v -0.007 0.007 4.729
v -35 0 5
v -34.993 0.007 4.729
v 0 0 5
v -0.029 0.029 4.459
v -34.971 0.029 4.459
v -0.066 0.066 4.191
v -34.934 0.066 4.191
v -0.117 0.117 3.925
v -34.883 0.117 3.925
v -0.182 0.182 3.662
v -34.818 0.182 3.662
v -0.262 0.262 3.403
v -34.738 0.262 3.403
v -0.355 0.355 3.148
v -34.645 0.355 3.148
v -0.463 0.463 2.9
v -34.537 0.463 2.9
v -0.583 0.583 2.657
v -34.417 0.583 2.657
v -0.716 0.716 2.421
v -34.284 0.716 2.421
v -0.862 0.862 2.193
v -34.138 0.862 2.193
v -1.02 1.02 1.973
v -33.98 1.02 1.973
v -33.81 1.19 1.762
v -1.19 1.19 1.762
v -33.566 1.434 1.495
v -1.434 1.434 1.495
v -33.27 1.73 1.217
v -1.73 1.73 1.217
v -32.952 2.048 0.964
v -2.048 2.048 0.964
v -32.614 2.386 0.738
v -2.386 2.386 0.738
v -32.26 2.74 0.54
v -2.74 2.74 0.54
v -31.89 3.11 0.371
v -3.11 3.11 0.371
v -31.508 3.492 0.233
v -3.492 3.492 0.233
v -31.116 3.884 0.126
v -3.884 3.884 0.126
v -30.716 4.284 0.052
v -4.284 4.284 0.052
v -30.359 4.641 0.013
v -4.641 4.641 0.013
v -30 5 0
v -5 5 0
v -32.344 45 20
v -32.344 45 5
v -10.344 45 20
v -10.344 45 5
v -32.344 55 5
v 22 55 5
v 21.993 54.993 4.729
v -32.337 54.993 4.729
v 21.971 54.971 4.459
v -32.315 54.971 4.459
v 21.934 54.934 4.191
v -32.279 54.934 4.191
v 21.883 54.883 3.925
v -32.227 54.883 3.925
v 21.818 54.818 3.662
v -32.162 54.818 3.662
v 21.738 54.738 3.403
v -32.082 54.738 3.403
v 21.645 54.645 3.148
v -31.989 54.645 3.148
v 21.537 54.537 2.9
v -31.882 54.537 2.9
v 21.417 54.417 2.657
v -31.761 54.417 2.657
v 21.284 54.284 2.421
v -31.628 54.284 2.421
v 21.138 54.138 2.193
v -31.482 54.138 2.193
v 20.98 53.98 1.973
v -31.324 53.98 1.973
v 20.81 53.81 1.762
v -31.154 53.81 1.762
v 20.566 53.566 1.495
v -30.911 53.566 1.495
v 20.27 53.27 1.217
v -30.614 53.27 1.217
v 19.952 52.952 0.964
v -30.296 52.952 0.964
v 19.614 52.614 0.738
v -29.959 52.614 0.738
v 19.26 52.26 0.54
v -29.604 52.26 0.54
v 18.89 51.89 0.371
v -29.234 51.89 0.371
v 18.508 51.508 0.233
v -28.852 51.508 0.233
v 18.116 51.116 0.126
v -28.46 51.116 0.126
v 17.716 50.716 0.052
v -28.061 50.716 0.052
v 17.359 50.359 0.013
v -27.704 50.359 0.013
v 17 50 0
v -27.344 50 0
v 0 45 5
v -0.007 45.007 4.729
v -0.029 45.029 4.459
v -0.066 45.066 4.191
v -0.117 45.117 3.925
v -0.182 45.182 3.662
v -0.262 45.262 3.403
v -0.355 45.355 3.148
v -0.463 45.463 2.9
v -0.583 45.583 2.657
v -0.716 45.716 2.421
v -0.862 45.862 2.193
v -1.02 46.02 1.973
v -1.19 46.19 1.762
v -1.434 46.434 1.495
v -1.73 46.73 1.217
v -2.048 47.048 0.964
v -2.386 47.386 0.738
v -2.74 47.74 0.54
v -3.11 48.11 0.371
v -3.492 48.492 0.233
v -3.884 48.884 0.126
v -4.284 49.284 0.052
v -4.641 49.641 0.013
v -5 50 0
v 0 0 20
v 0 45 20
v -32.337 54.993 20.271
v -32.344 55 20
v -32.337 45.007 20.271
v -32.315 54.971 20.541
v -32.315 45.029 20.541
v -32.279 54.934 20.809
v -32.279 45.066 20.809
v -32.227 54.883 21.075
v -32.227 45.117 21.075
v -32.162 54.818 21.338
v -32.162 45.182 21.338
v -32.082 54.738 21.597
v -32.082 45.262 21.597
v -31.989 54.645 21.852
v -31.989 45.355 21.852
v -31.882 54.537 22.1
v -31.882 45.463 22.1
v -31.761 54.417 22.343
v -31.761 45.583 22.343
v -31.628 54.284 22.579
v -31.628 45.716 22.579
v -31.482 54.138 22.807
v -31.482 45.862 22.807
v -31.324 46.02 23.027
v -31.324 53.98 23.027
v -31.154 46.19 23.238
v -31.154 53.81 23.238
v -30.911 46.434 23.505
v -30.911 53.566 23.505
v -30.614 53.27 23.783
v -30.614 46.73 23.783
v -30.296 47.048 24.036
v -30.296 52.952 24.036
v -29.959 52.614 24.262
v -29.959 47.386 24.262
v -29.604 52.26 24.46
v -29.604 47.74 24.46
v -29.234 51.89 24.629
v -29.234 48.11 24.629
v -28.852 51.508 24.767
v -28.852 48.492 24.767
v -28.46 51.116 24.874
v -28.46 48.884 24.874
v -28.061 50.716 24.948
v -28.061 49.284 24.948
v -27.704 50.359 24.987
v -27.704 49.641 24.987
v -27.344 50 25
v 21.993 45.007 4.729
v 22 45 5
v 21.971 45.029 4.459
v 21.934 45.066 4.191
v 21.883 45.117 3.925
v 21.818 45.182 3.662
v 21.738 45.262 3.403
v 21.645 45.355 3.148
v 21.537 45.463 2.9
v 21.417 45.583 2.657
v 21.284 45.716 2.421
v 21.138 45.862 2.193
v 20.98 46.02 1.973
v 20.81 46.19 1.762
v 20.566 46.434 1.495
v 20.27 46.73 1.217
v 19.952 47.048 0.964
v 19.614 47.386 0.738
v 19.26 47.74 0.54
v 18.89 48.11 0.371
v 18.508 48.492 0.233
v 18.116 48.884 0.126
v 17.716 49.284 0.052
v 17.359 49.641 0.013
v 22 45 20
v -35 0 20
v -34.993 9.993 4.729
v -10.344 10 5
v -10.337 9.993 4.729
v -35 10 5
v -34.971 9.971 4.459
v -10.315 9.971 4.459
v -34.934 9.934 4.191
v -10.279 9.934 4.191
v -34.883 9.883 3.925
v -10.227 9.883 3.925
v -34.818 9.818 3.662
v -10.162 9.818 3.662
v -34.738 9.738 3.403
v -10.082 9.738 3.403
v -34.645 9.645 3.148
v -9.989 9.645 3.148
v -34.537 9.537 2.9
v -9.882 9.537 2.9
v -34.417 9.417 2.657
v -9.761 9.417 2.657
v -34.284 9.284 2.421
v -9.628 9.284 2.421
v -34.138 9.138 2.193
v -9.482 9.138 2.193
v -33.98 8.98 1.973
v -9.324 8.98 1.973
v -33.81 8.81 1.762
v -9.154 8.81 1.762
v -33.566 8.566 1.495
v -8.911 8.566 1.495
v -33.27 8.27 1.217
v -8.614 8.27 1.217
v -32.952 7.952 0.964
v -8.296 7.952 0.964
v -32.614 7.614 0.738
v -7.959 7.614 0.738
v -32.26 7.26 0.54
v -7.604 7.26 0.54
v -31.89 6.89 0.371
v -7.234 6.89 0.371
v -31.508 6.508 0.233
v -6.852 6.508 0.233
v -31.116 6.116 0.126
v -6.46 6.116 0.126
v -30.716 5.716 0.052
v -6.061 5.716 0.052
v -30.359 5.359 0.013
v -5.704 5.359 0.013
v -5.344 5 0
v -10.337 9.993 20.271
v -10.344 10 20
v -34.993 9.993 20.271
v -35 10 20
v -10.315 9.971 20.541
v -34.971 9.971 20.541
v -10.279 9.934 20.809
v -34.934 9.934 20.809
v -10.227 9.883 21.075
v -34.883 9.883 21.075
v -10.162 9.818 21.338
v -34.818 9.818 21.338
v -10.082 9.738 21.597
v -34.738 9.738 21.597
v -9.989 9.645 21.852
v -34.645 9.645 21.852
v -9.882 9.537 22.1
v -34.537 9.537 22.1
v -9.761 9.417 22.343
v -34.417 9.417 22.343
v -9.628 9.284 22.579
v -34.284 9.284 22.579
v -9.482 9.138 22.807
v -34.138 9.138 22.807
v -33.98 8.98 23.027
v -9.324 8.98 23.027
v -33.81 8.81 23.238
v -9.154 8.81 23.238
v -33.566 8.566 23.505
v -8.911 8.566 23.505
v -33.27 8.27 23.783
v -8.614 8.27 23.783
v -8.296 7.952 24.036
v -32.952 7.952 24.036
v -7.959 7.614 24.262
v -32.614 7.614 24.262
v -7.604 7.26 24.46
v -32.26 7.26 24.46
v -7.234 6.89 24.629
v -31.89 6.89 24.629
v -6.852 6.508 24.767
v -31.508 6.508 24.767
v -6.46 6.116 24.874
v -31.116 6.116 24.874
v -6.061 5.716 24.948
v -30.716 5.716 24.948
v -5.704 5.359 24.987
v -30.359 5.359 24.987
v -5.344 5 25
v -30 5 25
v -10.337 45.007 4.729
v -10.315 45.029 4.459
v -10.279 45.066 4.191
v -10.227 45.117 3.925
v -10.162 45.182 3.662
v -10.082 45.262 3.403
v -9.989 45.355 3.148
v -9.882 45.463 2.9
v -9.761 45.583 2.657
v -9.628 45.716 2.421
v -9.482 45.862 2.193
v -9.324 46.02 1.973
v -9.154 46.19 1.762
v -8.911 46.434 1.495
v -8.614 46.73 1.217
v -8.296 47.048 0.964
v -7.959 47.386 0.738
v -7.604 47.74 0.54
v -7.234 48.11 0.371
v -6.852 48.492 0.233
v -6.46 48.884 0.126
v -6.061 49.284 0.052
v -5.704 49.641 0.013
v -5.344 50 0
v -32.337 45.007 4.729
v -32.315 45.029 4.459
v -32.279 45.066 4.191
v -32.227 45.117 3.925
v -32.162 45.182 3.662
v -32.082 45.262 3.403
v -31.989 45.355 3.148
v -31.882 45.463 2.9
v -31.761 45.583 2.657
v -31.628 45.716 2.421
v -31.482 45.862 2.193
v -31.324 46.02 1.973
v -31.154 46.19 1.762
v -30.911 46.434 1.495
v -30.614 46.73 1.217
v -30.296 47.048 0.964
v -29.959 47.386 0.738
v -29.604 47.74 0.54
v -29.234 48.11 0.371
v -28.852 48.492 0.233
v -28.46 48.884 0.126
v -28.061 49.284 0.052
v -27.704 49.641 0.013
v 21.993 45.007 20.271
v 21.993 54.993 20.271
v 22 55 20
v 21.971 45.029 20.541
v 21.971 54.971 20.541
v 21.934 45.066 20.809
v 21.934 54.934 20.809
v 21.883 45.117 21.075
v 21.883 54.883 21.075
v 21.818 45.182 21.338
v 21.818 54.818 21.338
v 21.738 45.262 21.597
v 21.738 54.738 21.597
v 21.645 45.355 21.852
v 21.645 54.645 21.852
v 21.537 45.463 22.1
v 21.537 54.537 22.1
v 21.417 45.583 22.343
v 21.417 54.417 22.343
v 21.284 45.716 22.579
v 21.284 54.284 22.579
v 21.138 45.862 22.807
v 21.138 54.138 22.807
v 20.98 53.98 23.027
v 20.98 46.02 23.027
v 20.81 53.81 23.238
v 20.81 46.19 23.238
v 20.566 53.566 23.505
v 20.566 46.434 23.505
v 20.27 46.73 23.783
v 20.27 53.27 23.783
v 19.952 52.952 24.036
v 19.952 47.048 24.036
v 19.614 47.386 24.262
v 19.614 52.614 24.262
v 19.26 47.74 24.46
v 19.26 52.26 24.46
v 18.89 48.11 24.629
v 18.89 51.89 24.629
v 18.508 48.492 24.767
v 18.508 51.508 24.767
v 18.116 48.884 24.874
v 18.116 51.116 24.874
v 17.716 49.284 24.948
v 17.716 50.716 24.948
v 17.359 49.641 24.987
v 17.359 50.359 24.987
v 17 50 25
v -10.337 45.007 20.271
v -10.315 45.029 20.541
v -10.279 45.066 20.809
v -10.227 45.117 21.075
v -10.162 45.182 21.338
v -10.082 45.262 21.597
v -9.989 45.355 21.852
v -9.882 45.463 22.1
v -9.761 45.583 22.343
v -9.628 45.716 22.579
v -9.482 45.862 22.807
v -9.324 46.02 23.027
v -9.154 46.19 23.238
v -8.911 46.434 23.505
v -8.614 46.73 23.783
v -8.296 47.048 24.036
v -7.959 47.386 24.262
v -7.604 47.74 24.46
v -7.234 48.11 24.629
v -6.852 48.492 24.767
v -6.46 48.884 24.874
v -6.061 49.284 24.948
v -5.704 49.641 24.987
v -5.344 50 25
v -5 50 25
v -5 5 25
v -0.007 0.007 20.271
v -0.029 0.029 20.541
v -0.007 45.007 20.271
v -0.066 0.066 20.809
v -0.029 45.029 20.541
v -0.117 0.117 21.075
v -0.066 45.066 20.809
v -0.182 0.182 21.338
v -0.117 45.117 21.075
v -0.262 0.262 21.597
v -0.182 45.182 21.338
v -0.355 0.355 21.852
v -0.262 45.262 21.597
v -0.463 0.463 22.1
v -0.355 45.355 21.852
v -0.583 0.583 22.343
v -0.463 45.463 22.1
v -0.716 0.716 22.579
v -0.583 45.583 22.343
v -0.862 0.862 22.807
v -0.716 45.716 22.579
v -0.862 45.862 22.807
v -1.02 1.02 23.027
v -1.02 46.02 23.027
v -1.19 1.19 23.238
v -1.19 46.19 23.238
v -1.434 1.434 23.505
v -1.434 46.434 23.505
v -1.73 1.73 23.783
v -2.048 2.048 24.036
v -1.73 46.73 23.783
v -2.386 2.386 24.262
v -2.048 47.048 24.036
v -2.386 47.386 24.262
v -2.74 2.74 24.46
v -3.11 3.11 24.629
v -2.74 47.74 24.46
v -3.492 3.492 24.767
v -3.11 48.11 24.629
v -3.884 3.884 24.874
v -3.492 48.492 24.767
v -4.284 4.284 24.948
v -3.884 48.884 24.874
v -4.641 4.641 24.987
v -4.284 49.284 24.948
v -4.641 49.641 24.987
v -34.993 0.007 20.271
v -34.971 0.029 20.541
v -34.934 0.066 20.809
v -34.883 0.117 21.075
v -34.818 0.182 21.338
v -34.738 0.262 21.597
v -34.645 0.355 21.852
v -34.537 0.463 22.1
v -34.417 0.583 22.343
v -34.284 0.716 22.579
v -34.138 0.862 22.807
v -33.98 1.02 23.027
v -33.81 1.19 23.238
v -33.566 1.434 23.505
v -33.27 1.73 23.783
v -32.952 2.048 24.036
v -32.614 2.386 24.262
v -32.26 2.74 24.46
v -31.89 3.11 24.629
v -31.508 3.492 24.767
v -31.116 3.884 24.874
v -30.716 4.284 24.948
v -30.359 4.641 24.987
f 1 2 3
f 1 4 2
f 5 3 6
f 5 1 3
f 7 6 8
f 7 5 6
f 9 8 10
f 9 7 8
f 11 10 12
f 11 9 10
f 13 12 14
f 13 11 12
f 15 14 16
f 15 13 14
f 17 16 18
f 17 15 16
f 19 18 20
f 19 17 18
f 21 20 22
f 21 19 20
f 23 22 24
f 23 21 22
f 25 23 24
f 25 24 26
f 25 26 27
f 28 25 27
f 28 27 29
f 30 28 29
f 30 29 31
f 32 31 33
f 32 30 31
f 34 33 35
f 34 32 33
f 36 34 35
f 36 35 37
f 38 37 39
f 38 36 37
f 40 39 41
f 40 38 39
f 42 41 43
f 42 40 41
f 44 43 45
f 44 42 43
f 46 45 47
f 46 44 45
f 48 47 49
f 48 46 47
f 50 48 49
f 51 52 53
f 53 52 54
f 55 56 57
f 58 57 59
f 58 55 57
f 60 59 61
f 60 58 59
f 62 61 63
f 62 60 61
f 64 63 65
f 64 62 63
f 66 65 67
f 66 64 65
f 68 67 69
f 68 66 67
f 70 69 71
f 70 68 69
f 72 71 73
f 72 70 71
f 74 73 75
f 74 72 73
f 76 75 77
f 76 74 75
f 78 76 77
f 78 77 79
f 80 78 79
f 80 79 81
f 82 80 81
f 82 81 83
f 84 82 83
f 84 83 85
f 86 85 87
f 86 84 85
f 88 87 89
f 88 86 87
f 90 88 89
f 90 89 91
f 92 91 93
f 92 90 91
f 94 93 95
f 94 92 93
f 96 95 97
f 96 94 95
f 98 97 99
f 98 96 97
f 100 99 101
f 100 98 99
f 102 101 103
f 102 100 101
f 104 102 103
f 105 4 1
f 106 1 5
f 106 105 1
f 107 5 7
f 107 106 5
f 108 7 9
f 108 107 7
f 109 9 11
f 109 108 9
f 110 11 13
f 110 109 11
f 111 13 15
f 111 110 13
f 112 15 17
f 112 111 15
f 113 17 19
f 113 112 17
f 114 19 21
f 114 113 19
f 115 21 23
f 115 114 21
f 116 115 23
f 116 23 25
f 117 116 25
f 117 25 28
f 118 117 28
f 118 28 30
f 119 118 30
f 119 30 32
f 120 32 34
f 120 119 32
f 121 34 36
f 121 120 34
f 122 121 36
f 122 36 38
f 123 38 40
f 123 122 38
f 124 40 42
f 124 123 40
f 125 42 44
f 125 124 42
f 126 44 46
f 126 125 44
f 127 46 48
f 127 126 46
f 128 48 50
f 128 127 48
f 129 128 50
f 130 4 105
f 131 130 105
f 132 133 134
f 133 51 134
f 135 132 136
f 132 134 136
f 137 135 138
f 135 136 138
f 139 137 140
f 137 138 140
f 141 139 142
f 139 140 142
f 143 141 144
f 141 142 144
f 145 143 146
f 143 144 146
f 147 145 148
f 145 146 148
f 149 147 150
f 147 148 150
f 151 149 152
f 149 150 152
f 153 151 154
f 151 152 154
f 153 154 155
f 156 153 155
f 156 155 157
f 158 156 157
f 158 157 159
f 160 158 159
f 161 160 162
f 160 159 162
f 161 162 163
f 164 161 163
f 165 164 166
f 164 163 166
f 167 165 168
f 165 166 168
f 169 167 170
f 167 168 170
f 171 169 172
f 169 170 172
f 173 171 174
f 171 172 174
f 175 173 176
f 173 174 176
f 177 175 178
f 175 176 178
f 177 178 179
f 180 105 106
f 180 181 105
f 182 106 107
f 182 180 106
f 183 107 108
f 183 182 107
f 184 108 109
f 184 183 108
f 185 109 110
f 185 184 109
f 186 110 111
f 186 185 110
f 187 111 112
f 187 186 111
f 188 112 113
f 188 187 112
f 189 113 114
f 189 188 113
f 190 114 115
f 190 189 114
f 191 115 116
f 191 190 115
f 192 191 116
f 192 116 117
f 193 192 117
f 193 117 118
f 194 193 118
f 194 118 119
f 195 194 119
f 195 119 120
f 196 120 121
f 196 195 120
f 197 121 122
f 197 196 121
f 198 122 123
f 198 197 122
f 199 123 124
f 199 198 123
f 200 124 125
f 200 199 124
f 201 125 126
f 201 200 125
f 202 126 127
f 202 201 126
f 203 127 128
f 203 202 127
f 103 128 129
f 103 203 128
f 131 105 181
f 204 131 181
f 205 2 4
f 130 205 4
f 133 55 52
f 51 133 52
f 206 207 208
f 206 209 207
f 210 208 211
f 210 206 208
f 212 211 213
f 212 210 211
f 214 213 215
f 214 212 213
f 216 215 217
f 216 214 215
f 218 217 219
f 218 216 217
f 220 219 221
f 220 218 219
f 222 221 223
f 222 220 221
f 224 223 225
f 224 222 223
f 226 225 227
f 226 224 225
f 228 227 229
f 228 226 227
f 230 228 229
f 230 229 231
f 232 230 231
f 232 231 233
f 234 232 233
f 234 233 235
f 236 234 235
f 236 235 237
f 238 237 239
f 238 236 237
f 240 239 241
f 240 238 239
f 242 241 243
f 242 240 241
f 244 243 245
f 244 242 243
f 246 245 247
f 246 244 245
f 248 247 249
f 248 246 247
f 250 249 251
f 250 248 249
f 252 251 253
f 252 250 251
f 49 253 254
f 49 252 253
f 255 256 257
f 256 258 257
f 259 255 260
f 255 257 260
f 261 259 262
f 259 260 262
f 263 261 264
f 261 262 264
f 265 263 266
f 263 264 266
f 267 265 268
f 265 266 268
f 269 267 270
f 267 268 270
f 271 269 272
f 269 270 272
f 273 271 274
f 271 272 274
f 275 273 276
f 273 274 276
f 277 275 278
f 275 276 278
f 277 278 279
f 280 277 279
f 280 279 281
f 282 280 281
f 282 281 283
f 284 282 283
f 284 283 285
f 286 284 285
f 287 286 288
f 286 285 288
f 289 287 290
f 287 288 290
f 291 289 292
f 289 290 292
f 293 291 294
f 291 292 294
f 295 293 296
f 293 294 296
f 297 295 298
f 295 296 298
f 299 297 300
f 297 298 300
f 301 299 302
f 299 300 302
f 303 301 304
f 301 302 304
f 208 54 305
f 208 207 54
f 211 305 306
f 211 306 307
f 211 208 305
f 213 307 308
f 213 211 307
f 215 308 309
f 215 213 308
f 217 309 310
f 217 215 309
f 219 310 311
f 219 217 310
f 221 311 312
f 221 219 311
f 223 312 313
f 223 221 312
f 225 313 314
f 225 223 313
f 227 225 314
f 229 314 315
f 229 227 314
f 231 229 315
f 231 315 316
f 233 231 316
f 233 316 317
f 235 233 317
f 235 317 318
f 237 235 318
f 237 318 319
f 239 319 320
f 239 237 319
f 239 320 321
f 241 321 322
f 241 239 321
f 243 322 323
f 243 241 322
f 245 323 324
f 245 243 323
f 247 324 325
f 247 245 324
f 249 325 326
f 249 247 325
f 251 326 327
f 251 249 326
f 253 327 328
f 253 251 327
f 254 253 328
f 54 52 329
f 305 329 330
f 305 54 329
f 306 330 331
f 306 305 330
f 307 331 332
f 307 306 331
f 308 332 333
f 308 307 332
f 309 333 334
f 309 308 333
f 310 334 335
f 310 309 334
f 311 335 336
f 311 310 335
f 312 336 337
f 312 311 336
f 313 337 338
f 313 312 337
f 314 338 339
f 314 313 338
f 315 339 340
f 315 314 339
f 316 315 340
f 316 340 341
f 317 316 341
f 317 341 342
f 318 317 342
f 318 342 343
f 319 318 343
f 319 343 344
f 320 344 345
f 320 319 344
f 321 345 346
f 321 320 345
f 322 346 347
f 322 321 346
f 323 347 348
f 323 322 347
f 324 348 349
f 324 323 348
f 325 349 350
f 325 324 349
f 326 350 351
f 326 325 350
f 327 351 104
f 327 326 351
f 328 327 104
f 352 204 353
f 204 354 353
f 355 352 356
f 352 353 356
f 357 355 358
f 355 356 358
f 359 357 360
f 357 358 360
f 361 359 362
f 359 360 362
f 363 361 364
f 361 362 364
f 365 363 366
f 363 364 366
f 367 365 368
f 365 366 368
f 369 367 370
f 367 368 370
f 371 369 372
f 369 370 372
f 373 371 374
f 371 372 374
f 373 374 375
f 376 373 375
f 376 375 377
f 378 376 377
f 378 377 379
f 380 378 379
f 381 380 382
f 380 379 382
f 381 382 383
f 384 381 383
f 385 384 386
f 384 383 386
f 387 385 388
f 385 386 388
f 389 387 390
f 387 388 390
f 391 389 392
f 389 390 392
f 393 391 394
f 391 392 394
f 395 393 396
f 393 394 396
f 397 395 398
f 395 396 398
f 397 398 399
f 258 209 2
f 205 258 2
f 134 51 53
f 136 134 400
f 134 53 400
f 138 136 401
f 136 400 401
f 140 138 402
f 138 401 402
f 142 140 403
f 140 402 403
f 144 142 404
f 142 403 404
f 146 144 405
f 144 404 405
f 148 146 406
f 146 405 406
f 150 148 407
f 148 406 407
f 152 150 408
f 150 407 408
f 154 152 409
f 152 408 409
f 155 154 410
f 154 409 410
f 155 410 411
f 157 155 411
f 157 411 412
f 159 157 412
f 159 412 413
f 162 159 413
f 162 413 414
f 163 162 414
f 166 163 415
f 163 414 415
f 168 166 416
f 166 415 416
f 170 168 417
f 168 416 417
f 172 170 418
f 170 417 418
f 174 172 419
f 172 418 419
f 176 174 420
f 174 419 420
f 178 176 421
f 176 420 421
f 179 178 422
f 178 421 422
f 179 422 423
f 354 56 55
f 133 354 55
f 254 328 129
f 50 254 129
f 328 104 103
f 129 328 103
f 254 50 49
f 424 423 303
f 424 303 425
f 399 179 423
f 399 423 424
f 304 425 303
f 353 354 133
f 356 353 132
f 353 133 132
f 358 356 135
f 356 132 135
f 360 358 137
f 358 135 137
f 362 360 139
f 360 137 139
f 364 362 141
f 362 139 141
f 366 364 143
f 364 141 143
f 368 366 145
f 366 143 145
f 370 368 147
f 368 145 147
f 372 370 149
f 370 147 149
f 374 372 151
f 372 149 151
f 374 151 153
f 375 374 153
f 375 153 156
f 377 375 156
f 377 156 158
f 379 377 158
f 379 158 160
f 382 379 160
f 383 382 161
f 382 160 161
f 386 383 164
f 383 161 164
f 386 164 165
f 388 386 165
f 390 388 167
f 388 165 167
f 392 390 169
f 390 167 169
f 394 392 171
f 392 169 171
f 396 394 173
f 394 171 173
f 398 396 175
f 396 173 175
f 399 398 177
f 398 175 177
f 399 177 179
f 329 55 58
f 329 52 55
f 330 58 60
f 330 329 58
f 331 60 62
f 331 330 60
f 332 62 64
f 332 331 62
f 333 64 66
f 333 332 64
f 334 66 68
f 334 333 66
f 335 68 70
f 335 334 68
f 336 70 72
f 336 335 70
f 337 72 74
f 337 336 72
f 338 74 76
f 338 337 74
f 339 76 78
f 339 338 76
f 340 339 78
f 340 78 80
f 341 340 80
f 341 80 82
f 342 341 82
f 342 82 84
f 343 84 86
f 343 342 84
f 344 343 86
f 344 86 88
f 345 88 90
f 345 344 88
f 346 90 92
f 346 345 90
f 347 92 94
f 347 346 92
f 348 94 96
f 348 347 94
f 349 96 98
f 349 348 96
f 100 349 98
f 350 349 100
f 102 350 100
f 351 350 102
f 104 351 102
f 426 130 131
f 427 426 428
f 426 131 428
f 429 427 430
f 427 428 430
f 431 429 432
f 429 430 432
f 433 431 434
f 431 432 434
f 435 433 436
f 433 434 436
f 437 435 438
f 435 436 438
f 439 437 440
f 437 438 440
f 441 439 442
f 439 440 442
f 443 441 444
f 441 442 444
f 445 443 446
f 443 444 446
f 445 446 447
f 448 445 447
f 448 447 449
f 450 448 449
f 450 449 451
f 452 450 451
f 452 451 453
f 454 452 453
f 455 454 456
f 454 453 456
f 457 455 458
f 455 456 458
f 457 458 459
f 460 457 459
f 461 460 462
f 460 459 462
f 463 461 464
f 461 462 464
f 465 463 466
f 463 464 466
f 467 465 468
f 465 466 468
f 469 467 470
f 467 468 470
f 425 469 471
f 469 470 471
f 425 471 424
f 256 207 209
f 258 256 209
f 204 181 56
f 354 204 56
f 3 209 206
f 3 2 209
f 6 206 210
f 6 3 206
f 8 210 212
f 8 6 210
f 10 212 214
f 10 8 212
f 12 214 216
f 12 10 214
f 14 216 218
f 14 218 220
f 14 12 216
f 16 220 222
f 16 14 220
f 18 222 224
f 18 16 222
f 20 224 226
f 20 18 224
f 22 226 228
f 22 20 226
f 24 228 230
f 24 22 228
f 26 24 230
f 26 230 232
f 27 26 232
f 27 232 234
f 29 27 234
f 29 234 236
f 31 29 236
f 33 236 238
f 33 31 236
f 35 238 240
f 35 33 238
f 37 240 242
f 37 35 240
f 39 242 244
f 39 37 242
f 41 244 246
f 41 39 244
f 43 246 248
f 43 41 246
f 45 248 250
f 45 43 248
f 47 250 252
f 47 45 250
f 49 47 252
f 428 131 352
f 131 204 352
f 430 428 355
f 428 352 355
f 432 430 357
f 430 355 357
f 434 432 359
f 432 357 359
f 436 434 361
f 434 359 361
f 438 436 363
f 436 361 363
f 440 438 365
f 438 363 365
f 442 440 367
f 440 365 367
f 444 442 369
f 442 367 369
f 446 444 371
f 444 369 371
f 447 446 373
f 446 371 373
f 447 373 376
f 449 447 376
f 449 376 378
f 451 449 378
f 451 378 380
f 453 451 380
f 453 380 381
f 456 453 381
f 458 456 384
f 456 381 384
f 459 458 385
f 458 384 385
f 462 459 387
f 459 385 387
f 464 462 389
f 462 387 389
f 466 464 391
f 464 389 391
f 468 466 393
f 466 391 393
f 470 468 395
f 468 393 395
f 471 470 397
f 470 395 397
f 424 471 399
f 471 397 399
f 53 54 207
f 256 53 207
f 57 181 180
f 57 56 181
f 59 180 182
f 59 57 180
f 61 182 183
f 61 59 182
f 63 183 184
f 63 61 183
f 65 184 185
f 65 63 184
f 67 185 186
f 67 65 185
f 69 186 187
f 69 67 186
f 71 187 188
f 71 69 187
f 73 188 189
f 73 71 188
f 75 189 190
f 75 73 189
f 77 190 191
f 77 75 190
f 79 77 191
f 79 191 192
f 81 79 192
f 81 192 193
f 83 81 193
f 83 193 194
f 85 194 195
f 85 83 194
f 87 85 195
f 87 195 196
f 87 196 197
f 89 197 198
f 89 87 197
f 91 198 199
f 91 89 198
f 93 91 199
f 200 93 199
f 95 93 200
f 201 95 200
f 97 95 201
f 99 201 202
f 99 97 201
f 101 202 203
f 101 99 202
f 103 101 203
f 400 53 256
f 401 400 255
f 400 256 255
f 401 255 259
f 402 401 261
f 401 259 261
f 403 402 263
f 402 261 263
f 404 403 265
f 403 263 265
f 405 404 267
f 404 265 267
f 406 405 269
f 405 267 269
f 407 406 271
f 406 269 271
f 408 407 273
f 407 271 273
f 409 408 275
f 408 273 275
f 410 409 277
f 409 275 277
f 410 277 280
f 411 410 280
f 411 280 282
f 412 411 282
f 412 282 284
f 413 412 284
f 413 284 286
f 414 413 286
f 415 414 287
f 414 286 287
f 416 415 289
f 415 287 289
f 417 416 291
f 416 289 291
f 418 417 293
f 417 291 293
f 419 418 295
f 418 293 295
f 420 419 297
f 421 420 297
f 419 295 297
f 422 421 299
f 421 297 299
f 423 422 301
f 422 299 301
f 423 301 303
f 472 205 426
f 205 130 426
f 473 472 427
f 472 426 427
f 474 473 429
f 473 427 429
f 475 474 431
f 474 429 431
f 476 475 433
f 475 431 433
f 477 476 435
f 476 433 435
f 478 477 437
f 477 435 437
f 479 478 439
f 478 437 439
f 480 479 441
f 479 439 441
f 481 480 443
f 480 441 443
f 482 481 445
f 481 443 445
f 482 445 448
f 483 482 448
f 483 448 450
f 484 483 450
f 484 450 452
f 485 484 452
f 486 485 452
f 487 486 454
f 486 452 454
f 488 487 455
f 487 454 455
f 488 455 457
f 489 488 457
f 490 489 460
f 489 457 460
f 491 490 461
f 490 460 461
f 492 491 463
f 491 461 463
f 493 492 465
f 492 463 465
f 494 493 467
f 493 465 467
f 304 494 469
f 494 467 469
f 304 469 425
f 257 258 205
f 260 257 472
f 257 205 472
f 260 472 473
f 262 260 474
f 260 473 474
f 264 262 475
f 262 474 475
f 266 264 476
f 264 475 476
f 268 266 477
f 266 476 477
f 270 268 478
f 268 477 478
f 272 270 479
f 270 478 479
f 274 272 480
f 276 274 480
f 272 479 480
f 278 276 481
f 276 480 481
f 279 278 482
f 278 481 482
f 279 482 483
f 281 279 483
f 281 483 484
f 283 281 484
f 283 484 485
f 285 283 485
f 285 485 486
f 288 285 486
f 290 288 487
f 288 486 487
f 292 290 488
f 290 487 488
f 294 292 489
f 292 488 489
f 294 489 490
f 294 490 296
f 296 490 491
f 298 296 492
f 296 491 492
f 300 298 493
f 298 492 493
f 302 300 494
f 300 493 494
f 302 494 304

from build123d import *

# Parameters (mm, degrees)
F1_DEPTH = 25
F2_R     = 4.99999


# Not quite as in the source:
# - a fillet or chamfer is up to 0.001 mm smaller than in the source, because OpenCascade refuses the exact size


with BuildPart() as f1:
    # F0 (on Top) → F1 (new body)
    with BuildSketch(Plane.XY):
        Polygon((-35, 0), (0, 0), (0, 45), (22, 45), (22, 55), (-32.3444679379, 55), (-32.3444679379, 45), (-10.3444679379, 45), (-10.3444679379, 10), (-35, 10), align=None)
    extrude(amount=F1_DEPTH)

    # F2 (radius 5 in the source; OpenCascade refuses exactly that, so slightly less here)
    f2_edges = [f1.edges().sort_by_distance(p)[0] for p in [
        (-5.172234, 55, 0),
        (-32.344468, 50, 0),
        (-10.344468, 27.5, 0),
        (-21.344468, 45, 0),
        (11, 45, 0),
        (22, 50, 0),
        (0, 22.5, 0),
        (-17.5, 0, 0),
        (-22.672234, 10, 0),
        (-35, 5, 0),
        (-5.172234, 55, 25),
        (11, 45, 25),
        (-21.344468, 45, 25),
        (-32.344468, 50, 25),
        (22, 50, 25),
        (-10.344468, 27.5, 25),
        (-22.672234, 10, 25),
        (-35, 5, 25),
        (-17.5, 0, 25),
        (0, 22.5, 25),
    ]]
    fillet(f2_edges, radius=F2_R)


solid = f1.part
